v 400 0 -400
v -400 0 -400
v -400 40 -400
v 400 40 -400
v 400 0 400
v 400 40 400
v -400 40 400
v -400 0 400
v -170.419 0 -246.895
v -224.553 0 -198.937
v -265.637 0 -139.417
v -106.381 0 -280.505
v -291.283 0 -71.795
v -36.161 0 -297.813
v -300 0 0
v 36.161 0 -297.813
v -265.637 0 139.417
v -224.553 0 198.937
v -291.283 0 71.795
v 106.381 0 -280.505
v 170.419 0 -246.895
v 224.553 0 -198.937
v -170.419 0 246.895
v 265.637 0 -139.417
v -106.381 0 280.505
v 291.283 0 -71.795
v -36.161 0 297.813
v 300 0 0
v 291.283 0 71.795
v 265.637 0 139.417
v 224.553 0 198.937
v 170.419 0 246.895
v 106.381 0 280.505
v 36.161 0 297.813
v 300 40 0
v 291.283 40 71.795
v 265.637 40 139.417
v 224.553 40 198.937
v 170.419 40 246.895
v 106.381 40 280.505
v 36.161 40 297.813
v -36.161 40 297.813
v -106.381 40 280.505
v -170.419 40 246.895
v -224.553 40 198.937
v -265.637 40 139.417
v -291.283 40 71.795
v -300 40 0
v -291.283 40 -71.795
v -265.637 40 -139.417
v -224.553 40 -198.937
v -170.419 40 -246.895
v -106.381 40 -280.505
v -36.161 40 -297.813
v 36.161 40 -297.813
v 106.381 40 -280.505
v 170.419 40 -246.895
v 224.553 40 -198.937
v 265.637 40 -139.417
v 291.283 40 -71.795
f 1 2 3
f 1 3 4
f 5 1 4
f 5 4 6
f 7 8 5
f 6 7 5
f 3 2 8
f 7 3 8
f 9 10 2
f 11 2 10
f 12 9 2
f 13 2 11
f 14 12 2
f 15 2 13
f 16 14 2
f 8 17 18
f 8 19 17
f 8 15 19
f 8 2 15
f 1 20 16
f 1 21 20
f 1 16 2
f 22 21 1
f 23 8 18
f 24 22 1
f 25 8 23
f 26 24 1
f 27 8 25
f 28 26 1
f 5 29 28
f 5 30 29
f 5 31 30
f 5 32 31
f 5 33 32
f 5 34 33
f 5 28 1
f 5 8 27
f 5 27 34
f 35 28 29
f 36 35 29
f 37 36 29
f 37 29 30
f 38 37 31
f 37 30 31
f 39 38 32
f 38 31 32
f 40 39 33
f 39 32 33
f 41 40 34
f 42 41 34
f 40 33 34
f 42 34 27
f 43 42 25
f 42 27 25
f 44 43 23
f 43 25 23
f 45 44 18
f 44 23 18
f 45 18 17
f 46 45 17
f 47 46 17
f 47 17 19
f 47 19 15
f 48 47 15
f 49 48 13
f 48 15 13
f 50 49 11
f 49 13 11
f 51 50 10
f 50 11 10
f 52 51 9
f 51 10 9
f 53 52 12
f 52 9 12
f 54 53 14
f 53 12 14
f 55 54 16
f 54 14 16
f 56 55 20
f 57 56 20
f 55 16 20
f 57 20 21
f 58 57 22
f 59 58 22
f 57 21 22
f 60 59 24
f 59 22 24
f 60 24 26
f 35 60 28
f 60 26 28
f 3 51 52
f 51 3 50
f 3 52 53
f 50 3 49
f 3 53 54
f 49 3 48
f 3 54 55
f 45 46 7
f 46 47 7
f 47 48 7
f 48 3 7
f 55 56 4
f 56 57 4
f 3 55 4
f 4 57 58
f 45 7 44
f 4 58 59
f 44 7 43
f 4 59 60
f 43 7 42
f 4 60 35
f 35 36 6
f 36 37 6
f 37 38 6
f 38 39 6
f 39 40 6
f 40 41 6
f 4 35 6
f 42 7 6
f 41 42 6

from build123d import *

# Parameters (mm, degrees)
F0_W     = 800
F0_H     = 800
F1_DEPTH = 40
F2_R     = 300
F3_DEPTH = 40


with BuildPart() as f1:
    # F0 (on Front) → F1 (new body)
    with BuildSketch(Plane.XZ):
        Rectangle(F0_W, F0_H)
    extrude(amount=-F1_DEPTH)

    # F2 (on face) → F3 (cut)
    with BuildSketch(Plane.XZ):
        Circle(F2_R)
    extrude(amount=-F3_DEPTH, mode=Mode.SUBTRACT)


solid = f1.part
